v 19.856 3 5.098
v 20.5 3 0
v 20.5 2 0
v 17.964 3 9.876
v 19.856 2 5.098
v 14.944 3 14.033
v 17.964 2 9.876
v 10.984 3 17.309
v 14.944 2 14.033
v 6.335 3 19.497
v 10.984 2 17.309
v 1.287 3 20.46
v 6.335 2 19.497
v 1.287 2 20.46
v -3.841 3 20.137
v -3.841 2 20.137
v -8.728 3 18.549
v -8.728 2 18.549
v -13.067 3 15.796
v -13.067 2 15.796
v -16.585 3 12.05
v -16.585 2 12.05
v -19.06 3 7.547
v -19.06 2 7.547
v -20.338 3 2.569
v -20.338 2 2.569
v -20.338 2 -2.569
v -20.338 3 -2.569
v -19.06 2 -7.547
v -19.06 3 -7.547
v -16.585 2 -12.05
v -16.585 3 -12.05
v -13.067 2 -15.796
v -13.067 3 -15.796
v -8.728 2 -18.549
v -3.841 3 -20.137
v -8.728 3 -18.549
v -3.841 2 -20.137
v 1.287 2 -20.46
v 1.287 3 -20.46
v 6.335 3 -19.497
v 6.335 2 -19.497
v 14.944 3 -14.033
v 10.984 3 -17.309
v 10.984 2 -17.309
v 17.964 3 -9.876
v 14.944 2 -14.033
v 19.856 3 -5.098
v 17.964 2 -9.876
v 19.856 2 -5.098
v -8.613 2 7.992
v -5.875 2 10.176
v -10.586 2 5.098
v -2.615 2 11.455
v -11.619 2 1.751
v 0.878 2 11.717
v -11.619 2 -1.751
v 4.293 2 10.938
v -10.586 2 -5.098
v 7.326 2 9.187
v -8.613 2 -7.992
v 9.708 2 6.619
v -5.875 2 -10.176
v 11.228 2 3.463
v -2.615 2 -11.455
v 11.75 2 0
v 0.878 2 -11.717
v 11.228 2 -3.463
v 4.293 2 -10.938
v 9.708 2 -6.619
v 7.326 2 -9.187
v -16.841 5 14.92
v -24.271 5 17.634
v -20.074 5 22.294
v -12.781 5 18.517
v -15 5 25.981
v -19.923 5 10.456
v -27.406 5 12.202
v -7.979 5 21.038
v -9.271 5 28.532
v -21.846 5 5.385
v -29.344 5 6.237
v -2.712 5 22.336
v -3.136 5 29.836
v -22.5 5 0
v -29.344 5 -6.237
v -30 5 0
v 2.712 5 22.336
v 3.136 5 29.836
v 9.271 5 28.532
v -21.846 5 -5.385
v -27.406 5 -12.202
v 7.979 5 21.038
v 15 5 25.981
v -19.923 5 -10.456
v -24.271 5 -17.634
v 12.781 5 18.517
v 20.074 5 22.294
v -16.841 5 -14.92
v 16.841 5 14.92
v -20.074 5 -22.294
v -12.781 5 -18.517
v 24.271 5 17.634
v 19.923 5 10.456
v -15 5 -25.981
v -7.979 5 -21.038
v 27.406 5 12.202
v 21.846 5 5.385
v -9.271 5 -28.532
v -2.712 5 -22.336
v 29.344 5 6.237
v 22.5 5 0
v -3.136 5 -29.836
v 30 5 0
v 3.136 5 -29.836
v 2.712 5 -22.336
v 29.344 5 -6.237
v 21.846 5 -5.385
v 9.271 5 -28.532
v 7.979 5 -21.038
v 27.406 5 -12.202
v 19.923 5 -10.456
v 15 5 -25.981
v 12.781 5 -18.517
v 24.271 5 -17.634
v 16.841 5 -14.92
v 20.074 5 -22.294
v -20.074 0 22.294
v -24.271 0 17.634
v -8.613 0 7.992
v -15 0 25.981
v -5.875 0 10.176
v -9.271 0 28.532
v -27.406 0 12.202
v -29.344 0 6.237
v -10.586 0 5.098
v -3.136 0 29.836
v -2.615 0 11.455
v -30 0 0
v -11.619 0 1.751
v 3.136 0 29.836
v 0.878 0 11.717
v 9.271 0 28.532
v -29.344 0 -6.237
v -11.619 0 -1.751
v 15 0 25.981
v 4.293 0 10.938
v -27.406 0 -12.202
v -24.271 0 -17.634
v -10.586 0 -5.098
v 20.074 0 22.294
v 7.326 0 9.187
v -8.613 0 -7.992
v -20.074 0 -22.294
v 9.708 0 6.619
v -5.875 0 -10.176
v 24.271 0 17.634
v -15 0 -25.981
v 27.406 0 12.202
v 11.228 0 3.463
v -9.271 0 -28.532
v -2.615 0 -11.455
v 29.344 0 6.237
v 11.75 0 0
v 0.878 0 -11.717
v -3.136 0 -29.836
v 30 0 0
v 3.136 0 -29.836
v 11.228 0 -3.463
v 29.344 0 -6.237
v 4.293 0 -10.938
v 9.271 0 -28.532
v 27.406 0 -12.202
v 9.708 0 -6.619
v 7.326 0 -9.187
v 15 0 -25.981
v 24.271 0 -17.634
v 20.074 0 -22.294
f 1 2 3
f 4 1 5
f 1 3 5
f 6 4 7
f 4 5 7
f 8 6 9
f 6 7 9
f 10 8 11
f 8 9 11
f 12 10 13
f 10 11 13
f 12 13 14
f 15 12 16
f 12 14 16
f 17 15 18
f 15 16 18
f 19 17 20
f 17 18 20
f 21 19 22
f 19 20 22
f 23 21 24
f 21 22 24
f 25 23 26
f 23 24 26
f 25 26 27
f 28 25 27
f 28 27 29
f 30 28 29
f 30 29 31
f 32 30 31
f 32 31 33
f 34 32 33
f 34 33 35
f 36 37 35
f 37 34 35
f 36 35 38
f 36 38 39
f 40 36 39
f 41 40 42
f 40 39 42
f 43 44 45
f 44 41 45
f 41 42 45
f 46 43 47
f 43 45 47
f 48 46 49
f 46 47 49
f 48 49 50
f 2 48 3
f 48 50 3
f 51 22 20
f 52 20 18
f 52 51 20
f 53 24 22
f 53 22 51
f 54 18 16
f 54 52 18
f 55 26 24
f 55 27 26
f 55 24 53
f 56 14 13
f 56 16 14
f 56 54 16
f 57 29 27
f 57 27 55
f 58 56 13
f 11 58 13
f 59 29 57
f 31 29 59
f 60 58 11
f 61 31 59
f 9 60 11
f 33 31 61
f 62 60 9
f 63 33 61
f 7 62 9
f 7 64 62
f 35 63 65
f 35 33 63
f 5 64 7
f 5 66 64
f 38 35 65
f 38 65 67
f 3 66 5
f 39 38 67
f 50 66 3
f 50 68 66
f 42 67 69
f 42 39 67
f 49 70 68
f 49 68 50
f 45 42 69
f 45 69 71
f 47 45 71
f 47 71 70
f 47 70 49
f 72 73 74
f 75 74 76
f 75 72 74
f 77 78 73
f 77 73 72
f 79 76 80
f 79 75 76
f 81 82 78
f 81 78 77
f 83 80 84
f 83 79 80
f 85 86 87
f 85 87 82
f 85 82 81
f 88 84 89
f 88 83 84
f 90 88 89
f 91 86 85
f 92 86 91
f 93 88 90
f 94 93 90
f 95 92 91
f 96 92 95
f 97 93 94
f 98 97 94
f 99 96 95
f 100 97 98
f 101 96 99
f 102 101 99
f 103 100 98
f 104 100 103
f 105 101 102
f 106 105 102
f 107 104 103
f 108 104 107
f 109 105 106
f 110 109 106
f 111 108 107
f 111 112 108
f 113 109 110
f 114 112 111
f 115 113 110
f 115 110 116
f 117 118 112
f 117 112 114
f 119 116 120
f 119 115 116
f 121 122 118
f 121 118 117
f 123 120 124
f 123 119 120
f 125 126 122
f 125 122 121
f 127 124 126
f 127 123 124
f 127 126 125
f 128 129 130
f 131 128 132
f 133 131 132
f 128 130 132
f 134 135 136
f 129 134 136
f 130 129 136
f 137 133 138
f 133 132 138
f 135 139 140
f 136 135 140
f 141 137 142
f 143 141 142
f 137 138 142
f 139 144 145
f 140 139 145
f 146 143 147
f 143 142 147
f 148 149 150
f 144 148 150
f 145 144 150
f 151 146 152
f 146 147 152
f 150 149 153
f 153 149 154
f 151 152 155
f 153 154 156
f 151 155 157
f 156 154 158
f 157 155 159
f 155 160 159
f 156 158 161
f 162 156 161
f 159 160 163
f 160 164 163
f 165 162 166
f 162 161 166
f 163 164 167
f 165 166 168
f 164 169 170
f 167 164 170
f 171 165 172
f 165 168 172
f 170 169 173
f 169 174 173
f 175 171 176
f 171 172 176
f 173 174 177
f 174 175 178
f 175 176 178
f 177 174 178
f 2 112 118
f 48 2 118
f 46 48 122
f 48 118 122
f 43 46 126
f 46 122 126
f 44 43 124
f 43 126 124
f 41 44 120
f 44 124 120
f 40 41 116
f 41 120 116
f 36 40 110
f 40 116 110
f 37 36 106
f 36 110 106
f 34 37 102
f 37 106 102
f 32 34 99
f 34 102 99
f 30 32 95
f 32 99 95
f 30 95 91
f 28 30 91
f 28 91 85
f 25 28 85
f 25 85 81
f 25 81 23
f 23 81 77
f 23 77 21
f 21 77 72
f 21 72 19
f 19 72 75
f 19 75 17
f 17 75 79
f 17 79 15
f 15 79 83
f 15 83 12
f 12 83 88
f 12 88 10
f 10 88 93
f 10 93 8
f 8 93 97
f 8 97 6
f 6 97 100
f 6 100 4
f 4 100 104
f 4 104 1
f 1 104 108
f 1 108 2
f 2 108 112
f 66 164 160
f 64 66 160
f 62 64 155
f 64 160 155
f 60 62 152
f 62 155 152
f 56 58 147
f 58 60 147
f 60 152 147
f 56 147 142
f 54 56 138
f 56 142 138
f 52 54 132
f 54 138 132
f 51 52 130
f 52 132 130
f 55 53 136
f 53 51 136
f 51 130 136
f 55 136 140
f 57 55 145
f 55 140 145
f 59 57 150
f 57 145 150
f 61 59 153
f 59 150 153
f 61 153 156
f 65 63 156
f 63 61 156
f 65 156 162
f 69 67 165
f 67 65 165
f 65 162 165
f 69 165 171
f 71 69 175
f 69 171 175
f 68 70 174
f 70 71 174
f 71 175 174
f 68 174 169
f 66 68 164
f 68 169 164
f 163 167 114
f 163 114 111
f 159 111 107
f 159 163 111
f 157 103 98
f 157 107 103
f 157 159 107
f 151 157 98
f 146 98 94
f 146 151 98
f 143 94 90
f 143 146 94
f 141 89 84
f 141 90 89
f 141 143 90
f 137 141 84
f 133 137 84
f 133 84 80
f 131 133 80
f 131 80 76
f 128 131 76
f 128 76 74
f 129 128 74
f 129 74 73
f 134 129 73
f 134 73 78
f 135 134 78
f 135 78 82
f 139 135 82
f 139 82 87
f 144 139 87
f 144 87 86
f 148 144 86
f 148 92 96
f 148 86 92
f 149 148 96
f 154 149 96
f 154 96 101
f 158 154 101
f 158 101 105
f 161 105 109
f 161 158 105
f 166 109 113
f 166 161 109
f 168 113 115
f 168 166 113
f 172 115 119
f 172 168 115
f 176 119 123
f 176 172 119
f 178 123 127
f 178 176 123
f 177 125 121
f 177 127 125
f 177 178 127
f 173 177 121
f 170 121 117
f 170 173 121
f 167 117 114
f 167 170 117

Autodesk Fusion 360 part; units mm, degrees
sketch "Sketch1" plane through (0, 0, 0) normal (0, 1, 0) x (1, 0, 0)
  circle A0 centre (0, 0) radius 11.75
  circle A1 centre (0, 0) radius 30
  circle A2 centre (0, 0) radius 20.5
  dimension "d1" = 23.5
  dimension "d2" = 60
  dimension "d3" = 41
extrude "Extrude1" add sketch "Sketch1" along normal blind 2 contours A1 | A2
extrude "Extrude2" add sketch "Sketch1" along normal blind 5 contours A1
chamfer "Chamfer1" distance 2 angle 45 1 edges at (-19.1127, 5, -7.4131)
